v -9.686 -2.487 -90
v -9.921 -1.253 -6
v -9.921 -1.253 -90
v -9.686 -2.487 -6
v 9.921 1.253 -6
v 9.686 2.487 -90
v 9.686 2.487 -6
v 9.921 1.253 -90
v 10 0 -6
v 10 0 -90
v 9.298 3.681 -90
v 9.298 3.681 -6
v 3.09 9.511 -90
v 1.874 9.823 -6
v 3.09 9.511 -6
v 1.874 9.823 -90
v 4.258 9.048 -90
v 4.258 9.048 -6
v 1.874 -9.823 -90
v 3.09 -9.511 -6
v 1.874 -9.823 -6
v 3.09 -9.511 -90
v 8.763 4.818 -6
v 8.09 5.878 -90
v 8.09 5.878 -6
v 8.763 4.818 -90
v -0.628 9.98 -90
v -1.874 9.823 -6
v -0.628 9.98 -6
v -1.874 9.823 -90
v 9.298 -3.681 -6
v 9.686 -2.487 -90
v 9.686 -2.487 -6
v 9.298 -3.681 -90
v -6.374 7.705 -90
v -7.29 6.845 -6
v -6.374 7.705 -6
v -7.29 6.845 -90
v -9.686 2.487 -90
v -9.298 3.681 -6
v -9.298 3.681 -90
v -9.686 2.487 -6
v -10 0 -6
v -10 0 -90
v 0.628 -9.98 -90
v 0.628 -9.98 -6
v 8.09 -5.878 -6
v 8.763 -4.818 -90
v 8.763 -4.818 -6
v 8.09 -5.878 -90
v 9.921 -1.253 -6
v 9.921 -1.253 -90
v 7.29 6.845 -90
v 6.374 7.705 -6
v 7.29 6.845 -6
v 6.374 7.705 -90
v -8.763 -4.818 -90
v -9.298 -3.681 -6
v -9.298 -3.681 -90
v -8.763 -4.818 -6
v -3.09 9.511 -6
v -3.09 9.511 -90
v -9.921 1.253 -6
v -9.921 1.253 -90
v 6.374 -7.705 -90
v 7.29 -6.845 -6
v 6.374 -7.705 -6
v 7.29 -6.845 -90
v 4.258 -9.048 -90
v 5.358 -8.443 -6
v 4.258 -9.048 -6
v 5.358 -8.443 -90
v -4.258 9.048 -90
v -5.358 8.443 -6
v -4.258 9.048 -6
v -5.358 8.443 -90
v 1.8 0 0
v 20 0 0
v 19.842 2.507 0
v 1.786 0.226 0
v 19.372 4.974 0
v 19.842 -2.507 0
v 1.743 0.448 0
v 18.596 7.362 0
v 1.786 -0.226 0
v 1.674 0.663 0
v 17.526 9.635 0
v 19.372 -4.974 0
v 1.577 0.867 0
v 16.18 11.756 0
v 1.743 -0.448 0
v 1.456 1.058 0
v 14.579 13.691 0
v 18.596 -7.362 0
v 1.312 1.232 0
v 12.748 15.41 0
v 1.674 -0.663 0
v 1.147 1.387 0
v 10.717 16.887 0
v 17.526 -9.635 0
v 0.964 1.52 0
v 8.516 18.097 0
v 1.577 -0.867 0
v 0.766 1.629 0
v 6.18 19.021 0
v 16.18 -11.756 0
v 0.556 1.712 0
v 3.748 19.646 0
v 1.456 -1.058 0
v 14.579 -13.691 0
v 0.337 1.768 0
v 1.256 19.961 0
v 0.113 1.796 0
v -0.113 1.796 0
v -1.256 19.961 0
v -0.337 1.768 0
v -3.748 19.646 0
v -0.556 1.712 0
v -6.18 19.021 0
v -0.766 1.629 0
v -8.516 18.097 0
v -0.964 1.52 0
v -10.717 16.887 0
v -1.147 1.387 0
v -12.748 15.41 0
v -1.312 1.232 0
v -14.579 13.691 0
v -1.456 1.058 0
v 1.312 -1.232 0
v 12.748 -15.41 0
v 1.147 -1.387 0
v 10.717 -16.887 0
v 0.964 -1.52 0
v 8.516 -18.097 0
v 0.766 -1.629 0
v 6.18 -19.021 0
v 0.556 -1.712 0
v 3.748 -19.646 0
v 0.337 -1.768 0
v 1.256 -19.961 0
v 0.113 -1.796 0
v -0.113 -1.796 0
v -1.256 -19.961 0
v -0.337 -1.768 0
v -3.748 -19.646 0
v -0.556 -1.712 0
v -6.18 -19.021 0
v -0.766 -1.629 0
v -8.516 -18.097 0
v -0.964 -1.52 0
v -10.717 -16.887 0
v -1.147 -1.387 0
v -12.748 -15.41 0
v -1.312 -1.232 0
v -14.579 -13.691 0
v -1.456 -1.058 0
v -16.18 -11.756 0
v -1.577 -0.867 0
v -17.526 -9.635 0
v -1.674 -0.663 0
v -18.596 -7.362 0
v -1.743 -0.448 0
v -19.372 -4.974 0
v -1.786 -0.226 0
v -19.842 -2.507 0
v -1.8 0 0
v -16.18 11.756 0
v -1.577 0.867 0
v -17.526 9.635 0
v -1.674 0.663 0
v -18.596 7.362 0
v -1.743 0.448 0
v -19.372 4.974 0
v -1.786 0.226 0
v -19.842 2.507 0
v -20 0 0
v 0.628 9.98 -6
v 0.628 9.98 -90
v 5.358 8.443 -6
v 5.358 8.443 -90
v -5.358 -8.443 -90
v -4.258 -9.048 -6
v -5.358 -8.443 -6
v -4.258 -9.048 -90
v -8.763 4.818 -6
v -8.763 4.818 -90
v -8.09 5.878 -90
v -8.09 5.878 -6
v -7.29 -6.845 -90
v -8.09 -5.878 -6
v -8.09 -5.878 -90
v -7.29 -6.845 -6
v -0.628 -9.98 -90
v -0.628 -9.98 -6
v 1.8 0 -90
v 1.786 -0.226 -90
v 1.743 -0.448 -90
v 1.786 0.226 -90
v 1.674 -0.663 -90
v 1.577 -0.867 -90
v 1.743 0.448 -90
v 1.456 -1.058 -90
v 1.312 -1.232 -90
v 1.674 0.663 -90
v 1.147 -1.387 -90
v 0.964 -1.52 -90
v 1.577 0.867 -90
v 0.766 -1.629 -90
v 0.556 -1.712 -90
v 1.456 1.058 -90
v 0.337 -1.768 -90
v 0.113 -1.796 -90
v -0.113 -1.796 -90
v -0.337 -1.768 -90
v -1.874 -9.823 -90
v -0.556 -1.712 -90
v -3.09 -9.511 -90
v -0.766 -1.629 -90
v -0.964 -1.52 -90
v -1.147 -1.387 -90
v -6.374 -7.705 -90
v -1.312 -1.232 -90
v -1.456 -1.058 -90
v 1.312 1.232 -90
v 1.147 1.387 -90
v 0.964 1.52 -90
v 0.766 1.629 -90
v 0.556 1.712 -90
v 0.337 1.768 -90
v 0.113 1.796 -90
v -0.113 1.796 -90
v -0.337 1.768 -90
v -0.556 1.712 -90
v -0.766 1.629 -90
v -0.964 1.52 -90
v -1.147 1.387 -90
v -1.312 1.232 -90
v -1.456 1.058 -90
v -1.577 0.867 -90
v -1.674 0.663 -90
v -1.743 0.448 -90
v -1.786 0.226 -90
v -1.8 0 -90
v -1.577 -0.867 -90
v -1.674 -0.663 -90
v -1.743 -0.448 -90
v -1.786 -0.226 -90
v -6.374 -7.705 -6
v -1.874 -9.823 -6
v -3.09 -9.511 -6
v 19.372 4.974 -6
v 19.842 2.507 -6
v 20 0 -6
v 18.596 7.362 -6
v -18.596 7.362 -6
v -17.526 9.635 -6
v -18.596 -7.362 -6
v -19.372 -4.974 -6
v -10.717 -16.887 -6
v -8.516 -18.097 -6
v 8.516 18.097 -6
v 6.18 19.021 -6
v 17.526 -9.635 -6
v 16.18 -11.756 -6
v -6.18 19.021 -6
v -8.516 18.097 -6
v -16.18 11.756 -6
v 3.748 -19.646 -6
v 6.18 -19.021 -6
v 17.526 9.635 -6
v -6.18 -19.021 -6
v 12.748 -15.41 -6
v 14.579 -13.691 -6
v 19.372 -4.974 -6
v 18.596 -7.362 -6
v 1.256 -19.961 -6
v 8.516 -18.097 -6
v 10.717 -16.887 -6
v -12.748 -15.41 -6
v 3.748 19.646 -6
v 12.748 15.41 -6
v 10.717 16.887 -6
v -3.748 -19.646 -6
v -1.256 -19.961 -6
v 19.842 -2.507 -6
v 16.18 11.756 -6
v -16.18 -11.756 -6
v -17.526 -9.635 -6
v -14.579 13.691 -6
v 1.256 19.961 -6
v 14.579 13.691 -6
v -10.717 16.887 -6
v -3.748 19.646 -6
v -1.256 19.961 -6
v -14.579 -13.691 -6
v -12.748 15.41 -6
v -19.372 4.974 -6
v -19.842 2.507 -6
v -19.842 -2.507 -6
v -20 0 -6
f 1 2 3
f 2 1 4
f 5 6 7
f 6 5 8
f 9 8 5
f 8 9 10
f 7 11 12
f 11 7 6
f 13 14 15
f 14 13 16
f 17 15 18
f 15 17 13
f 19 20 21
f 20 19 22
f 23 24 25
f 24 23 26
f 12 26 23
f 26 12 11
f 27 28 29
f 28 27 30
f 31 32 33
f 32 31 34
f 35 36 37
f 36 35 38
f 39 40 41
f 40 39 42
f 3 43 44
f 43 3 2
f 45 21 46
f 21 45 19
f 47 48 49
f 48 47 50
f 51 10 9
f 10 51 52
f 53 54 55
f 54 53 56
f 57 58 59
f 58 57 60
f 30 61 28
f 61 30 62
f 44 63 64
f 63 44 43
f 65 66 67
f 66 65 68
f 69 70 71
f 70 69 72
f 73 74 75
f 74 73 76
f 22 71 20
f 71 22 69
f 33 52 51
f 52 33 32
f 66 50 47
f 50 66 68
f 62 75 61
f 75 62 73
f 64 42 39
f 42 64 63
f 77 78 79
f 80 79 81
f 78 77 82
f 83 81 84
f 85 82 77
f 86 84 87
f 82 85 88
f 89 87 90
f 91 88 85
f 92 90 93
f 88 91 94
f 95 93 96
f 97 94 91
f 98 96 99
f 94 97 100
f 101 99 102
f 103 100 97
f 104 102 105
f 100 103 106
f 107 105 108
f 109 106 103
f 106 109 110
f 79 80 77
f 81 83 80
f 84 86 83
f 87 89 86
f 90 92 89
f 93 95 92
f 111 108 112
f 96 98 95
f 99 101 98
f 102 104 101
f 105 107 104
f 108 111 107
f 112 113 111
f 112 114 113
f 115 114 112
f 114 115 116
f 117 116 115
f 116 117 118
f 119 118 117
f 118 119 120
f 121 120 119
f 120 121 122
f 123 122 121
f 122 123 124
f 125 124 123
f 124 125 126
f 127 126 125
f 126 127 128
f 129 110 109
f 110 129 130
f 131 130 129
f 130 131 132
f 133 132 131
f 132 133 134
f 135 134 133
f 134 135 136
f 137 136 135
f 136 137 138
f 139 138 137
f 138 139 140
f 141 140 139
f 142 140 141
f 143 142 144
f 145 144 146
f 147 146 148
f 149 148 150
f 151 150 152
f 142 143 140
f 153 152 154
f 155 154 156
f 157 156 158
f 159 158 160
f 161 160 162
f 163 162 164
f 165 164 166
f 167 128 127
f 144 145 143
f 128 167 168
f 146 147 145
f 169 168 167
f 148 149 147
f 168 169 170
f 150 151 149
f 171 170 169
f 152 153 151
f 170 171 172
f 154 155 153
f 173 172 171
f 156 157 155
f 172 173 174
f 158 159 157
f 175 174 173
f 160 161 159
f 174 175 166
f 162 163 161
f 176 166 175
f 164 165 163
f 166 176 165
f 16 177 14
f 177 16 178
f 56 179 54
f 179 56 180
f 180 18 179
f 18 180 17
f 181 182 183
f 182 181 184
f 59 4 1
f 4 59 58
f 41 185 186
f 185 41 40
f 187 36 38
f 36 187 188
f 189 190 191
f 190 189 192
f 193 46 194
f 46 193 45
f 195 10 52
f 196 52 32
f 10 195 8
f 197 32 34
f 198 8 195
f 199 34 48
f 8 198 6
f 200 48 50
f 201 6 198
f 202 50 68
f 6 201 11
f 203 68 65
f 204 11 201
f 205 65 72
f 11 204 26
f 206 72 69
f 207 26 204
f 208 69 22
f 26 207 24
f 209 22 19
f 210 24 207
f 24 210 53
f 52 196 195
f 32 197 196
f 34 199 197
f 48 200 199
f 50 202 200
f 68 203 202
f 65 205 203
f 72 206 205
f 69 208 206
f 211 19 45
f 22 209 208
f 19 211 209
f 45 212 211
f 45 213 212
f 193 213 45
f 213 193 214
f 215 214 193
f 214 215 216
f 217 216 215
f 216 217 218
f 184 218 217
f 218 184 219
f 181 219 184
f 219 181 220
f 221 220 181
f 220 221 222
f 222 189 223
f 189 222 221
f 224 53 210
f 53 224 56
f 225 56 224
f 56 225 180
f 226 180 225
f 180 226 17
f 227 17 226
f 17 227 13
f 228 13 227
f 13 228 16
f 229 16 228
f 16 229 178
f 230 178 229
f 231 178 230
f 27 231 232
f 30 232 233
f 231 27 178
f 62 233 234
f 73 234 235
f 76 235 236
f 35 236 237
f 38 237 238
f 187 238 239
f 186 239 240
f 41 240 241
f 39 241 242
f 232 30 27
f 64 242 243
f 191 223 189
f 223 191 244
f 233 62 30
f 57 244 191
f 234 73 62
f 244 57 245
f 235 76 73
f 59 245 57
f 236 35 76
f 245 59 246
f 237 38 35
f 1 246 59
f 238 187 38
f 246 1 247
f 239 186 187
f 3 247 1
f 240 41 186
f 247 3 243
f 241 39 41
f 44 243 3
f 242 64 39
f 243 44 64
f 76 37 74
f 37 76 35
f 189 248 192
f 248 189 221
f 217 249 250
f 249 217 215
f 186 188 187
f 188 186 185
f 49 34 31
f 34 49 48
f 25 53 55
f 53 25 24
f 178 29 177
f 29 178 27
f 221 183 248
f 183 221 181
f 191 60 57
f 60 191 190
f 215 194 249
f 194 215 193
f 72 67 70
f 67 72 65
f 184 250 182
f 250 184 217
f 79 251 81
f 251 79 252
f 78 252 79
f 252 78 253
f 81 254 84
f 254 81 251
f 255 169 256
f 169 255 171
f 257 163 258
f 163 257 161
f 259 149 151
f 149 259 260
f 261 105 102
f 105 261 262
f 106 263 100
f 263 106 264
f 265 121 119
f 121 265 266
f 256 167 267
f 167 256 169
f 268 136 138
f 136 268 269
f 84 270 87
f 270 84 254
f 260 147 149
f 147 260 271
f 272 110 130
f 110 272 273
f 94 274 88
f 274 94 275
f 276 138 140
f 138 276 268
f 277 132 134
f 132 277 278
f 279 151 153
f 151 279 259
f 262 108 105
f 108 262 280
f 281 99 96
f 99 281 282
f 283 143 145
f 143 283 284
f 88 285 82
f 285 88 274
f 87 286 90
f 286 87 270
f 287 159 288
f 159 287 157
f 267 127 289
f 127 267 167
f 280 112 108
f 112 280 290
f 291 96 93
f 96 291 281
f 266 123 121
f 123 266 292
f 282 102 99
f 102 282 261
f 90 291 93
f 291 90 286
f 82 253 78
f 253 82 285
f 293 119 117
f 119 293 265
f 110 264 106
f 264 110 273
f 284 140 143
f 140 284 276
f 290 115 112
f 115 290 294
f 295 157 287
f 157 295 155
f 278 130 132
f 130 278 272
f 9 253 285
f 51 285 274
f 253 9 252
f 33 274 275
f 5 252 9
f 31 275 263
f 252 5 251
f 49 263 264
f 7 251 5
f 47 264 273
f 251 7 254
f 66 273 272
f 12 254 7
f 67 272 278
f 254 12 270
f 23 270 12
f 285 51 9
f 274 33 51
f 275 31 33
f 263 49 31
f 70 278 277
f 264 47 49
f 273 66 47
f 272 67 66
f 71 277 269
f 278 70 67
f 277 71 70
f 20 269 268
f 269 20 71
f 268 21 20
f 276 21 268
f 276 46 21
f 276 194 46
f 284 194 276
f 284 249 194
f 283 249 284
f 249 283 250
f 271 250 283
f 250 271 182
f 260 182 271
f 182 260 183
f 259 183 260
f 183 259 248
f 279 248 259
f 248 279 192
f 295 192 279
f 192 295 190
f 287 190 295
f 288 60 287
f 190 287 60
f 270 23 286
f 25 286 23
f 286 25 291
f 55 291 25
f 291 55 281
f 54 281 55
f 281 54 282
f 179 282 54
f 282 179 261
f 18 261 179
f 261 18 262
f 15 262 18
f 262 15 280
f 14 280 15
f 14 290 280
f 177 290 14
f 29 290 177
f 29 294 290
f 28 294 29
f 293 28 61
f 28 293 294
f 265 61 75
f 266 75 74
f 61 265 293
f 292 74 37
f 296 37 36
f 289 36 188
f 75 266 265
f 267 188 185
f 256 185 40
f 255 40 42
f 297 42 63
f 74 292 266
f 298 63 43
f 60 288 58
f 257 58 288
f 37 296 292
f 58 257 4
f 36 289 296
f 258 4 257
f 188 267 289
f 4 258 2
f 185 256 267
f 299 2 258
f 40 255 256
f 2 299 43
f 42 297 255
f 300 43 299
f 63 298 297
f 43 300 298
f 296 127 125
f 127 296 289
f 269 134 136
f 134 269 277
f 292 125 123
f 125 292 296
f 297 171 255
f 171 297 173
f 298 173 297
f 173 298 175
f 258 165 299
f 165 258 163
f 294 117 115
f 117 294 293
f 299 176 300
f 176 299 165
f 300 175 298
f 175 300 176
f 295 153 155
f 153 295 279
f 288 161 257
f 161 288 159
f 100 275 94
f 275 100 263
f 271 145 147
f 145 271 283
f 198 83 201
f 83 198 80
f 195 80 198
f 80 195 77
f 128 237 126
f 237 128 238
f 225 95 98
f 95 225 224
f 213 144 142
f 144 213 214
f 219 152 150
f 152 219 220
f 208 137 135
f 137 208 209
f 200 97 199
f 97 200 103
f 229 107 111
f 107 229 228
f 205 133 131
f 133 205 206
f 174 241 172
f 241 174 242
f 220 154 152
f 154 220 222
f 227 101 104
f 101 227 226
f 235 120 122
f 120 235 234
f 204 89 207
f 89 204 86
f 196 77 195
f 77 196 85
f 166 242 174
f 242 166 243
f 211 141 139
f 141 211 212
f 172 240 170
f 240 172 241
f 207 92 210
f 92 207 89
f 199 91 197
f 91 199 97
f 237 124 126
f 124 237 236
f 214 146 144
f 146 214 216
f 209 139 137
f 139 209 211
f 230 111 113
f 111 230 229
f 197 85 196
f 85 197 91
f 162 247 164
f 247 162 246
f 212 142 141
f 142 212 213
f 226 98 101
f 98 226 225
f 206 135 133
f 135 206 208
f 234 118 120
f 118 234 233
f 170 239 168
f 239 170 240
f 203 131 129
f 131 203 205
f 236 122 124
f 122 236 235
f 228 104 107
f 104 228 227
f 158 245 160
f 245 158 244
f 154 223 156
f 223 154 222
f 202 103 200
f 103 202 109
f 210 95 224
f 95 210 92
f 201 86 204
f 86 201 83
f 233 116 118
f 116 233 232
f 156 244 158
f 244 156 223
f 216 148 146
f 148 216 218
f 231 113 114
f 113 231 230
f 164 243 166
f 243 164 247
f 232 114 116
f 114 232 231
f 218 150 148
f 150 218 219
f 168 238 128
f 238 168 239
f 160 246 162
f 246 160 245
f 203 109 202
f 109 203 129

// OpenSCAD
$fn = 50;


difference() {
	union() {
		translate(v = [0, 0, -90.0000000000]) {
			cylinder(h = 90, r = 10.0000000000);
		}
		translate(v = [0, 0, -6.0000000000]) {
			cylinder(h = 6, r = 20.0000000000);
		}
	}
	union() {
		#translate(v = [0, 0, -90]) {
			cylinder(h = 90, r = 1.8000000000);
		}
	}
}
